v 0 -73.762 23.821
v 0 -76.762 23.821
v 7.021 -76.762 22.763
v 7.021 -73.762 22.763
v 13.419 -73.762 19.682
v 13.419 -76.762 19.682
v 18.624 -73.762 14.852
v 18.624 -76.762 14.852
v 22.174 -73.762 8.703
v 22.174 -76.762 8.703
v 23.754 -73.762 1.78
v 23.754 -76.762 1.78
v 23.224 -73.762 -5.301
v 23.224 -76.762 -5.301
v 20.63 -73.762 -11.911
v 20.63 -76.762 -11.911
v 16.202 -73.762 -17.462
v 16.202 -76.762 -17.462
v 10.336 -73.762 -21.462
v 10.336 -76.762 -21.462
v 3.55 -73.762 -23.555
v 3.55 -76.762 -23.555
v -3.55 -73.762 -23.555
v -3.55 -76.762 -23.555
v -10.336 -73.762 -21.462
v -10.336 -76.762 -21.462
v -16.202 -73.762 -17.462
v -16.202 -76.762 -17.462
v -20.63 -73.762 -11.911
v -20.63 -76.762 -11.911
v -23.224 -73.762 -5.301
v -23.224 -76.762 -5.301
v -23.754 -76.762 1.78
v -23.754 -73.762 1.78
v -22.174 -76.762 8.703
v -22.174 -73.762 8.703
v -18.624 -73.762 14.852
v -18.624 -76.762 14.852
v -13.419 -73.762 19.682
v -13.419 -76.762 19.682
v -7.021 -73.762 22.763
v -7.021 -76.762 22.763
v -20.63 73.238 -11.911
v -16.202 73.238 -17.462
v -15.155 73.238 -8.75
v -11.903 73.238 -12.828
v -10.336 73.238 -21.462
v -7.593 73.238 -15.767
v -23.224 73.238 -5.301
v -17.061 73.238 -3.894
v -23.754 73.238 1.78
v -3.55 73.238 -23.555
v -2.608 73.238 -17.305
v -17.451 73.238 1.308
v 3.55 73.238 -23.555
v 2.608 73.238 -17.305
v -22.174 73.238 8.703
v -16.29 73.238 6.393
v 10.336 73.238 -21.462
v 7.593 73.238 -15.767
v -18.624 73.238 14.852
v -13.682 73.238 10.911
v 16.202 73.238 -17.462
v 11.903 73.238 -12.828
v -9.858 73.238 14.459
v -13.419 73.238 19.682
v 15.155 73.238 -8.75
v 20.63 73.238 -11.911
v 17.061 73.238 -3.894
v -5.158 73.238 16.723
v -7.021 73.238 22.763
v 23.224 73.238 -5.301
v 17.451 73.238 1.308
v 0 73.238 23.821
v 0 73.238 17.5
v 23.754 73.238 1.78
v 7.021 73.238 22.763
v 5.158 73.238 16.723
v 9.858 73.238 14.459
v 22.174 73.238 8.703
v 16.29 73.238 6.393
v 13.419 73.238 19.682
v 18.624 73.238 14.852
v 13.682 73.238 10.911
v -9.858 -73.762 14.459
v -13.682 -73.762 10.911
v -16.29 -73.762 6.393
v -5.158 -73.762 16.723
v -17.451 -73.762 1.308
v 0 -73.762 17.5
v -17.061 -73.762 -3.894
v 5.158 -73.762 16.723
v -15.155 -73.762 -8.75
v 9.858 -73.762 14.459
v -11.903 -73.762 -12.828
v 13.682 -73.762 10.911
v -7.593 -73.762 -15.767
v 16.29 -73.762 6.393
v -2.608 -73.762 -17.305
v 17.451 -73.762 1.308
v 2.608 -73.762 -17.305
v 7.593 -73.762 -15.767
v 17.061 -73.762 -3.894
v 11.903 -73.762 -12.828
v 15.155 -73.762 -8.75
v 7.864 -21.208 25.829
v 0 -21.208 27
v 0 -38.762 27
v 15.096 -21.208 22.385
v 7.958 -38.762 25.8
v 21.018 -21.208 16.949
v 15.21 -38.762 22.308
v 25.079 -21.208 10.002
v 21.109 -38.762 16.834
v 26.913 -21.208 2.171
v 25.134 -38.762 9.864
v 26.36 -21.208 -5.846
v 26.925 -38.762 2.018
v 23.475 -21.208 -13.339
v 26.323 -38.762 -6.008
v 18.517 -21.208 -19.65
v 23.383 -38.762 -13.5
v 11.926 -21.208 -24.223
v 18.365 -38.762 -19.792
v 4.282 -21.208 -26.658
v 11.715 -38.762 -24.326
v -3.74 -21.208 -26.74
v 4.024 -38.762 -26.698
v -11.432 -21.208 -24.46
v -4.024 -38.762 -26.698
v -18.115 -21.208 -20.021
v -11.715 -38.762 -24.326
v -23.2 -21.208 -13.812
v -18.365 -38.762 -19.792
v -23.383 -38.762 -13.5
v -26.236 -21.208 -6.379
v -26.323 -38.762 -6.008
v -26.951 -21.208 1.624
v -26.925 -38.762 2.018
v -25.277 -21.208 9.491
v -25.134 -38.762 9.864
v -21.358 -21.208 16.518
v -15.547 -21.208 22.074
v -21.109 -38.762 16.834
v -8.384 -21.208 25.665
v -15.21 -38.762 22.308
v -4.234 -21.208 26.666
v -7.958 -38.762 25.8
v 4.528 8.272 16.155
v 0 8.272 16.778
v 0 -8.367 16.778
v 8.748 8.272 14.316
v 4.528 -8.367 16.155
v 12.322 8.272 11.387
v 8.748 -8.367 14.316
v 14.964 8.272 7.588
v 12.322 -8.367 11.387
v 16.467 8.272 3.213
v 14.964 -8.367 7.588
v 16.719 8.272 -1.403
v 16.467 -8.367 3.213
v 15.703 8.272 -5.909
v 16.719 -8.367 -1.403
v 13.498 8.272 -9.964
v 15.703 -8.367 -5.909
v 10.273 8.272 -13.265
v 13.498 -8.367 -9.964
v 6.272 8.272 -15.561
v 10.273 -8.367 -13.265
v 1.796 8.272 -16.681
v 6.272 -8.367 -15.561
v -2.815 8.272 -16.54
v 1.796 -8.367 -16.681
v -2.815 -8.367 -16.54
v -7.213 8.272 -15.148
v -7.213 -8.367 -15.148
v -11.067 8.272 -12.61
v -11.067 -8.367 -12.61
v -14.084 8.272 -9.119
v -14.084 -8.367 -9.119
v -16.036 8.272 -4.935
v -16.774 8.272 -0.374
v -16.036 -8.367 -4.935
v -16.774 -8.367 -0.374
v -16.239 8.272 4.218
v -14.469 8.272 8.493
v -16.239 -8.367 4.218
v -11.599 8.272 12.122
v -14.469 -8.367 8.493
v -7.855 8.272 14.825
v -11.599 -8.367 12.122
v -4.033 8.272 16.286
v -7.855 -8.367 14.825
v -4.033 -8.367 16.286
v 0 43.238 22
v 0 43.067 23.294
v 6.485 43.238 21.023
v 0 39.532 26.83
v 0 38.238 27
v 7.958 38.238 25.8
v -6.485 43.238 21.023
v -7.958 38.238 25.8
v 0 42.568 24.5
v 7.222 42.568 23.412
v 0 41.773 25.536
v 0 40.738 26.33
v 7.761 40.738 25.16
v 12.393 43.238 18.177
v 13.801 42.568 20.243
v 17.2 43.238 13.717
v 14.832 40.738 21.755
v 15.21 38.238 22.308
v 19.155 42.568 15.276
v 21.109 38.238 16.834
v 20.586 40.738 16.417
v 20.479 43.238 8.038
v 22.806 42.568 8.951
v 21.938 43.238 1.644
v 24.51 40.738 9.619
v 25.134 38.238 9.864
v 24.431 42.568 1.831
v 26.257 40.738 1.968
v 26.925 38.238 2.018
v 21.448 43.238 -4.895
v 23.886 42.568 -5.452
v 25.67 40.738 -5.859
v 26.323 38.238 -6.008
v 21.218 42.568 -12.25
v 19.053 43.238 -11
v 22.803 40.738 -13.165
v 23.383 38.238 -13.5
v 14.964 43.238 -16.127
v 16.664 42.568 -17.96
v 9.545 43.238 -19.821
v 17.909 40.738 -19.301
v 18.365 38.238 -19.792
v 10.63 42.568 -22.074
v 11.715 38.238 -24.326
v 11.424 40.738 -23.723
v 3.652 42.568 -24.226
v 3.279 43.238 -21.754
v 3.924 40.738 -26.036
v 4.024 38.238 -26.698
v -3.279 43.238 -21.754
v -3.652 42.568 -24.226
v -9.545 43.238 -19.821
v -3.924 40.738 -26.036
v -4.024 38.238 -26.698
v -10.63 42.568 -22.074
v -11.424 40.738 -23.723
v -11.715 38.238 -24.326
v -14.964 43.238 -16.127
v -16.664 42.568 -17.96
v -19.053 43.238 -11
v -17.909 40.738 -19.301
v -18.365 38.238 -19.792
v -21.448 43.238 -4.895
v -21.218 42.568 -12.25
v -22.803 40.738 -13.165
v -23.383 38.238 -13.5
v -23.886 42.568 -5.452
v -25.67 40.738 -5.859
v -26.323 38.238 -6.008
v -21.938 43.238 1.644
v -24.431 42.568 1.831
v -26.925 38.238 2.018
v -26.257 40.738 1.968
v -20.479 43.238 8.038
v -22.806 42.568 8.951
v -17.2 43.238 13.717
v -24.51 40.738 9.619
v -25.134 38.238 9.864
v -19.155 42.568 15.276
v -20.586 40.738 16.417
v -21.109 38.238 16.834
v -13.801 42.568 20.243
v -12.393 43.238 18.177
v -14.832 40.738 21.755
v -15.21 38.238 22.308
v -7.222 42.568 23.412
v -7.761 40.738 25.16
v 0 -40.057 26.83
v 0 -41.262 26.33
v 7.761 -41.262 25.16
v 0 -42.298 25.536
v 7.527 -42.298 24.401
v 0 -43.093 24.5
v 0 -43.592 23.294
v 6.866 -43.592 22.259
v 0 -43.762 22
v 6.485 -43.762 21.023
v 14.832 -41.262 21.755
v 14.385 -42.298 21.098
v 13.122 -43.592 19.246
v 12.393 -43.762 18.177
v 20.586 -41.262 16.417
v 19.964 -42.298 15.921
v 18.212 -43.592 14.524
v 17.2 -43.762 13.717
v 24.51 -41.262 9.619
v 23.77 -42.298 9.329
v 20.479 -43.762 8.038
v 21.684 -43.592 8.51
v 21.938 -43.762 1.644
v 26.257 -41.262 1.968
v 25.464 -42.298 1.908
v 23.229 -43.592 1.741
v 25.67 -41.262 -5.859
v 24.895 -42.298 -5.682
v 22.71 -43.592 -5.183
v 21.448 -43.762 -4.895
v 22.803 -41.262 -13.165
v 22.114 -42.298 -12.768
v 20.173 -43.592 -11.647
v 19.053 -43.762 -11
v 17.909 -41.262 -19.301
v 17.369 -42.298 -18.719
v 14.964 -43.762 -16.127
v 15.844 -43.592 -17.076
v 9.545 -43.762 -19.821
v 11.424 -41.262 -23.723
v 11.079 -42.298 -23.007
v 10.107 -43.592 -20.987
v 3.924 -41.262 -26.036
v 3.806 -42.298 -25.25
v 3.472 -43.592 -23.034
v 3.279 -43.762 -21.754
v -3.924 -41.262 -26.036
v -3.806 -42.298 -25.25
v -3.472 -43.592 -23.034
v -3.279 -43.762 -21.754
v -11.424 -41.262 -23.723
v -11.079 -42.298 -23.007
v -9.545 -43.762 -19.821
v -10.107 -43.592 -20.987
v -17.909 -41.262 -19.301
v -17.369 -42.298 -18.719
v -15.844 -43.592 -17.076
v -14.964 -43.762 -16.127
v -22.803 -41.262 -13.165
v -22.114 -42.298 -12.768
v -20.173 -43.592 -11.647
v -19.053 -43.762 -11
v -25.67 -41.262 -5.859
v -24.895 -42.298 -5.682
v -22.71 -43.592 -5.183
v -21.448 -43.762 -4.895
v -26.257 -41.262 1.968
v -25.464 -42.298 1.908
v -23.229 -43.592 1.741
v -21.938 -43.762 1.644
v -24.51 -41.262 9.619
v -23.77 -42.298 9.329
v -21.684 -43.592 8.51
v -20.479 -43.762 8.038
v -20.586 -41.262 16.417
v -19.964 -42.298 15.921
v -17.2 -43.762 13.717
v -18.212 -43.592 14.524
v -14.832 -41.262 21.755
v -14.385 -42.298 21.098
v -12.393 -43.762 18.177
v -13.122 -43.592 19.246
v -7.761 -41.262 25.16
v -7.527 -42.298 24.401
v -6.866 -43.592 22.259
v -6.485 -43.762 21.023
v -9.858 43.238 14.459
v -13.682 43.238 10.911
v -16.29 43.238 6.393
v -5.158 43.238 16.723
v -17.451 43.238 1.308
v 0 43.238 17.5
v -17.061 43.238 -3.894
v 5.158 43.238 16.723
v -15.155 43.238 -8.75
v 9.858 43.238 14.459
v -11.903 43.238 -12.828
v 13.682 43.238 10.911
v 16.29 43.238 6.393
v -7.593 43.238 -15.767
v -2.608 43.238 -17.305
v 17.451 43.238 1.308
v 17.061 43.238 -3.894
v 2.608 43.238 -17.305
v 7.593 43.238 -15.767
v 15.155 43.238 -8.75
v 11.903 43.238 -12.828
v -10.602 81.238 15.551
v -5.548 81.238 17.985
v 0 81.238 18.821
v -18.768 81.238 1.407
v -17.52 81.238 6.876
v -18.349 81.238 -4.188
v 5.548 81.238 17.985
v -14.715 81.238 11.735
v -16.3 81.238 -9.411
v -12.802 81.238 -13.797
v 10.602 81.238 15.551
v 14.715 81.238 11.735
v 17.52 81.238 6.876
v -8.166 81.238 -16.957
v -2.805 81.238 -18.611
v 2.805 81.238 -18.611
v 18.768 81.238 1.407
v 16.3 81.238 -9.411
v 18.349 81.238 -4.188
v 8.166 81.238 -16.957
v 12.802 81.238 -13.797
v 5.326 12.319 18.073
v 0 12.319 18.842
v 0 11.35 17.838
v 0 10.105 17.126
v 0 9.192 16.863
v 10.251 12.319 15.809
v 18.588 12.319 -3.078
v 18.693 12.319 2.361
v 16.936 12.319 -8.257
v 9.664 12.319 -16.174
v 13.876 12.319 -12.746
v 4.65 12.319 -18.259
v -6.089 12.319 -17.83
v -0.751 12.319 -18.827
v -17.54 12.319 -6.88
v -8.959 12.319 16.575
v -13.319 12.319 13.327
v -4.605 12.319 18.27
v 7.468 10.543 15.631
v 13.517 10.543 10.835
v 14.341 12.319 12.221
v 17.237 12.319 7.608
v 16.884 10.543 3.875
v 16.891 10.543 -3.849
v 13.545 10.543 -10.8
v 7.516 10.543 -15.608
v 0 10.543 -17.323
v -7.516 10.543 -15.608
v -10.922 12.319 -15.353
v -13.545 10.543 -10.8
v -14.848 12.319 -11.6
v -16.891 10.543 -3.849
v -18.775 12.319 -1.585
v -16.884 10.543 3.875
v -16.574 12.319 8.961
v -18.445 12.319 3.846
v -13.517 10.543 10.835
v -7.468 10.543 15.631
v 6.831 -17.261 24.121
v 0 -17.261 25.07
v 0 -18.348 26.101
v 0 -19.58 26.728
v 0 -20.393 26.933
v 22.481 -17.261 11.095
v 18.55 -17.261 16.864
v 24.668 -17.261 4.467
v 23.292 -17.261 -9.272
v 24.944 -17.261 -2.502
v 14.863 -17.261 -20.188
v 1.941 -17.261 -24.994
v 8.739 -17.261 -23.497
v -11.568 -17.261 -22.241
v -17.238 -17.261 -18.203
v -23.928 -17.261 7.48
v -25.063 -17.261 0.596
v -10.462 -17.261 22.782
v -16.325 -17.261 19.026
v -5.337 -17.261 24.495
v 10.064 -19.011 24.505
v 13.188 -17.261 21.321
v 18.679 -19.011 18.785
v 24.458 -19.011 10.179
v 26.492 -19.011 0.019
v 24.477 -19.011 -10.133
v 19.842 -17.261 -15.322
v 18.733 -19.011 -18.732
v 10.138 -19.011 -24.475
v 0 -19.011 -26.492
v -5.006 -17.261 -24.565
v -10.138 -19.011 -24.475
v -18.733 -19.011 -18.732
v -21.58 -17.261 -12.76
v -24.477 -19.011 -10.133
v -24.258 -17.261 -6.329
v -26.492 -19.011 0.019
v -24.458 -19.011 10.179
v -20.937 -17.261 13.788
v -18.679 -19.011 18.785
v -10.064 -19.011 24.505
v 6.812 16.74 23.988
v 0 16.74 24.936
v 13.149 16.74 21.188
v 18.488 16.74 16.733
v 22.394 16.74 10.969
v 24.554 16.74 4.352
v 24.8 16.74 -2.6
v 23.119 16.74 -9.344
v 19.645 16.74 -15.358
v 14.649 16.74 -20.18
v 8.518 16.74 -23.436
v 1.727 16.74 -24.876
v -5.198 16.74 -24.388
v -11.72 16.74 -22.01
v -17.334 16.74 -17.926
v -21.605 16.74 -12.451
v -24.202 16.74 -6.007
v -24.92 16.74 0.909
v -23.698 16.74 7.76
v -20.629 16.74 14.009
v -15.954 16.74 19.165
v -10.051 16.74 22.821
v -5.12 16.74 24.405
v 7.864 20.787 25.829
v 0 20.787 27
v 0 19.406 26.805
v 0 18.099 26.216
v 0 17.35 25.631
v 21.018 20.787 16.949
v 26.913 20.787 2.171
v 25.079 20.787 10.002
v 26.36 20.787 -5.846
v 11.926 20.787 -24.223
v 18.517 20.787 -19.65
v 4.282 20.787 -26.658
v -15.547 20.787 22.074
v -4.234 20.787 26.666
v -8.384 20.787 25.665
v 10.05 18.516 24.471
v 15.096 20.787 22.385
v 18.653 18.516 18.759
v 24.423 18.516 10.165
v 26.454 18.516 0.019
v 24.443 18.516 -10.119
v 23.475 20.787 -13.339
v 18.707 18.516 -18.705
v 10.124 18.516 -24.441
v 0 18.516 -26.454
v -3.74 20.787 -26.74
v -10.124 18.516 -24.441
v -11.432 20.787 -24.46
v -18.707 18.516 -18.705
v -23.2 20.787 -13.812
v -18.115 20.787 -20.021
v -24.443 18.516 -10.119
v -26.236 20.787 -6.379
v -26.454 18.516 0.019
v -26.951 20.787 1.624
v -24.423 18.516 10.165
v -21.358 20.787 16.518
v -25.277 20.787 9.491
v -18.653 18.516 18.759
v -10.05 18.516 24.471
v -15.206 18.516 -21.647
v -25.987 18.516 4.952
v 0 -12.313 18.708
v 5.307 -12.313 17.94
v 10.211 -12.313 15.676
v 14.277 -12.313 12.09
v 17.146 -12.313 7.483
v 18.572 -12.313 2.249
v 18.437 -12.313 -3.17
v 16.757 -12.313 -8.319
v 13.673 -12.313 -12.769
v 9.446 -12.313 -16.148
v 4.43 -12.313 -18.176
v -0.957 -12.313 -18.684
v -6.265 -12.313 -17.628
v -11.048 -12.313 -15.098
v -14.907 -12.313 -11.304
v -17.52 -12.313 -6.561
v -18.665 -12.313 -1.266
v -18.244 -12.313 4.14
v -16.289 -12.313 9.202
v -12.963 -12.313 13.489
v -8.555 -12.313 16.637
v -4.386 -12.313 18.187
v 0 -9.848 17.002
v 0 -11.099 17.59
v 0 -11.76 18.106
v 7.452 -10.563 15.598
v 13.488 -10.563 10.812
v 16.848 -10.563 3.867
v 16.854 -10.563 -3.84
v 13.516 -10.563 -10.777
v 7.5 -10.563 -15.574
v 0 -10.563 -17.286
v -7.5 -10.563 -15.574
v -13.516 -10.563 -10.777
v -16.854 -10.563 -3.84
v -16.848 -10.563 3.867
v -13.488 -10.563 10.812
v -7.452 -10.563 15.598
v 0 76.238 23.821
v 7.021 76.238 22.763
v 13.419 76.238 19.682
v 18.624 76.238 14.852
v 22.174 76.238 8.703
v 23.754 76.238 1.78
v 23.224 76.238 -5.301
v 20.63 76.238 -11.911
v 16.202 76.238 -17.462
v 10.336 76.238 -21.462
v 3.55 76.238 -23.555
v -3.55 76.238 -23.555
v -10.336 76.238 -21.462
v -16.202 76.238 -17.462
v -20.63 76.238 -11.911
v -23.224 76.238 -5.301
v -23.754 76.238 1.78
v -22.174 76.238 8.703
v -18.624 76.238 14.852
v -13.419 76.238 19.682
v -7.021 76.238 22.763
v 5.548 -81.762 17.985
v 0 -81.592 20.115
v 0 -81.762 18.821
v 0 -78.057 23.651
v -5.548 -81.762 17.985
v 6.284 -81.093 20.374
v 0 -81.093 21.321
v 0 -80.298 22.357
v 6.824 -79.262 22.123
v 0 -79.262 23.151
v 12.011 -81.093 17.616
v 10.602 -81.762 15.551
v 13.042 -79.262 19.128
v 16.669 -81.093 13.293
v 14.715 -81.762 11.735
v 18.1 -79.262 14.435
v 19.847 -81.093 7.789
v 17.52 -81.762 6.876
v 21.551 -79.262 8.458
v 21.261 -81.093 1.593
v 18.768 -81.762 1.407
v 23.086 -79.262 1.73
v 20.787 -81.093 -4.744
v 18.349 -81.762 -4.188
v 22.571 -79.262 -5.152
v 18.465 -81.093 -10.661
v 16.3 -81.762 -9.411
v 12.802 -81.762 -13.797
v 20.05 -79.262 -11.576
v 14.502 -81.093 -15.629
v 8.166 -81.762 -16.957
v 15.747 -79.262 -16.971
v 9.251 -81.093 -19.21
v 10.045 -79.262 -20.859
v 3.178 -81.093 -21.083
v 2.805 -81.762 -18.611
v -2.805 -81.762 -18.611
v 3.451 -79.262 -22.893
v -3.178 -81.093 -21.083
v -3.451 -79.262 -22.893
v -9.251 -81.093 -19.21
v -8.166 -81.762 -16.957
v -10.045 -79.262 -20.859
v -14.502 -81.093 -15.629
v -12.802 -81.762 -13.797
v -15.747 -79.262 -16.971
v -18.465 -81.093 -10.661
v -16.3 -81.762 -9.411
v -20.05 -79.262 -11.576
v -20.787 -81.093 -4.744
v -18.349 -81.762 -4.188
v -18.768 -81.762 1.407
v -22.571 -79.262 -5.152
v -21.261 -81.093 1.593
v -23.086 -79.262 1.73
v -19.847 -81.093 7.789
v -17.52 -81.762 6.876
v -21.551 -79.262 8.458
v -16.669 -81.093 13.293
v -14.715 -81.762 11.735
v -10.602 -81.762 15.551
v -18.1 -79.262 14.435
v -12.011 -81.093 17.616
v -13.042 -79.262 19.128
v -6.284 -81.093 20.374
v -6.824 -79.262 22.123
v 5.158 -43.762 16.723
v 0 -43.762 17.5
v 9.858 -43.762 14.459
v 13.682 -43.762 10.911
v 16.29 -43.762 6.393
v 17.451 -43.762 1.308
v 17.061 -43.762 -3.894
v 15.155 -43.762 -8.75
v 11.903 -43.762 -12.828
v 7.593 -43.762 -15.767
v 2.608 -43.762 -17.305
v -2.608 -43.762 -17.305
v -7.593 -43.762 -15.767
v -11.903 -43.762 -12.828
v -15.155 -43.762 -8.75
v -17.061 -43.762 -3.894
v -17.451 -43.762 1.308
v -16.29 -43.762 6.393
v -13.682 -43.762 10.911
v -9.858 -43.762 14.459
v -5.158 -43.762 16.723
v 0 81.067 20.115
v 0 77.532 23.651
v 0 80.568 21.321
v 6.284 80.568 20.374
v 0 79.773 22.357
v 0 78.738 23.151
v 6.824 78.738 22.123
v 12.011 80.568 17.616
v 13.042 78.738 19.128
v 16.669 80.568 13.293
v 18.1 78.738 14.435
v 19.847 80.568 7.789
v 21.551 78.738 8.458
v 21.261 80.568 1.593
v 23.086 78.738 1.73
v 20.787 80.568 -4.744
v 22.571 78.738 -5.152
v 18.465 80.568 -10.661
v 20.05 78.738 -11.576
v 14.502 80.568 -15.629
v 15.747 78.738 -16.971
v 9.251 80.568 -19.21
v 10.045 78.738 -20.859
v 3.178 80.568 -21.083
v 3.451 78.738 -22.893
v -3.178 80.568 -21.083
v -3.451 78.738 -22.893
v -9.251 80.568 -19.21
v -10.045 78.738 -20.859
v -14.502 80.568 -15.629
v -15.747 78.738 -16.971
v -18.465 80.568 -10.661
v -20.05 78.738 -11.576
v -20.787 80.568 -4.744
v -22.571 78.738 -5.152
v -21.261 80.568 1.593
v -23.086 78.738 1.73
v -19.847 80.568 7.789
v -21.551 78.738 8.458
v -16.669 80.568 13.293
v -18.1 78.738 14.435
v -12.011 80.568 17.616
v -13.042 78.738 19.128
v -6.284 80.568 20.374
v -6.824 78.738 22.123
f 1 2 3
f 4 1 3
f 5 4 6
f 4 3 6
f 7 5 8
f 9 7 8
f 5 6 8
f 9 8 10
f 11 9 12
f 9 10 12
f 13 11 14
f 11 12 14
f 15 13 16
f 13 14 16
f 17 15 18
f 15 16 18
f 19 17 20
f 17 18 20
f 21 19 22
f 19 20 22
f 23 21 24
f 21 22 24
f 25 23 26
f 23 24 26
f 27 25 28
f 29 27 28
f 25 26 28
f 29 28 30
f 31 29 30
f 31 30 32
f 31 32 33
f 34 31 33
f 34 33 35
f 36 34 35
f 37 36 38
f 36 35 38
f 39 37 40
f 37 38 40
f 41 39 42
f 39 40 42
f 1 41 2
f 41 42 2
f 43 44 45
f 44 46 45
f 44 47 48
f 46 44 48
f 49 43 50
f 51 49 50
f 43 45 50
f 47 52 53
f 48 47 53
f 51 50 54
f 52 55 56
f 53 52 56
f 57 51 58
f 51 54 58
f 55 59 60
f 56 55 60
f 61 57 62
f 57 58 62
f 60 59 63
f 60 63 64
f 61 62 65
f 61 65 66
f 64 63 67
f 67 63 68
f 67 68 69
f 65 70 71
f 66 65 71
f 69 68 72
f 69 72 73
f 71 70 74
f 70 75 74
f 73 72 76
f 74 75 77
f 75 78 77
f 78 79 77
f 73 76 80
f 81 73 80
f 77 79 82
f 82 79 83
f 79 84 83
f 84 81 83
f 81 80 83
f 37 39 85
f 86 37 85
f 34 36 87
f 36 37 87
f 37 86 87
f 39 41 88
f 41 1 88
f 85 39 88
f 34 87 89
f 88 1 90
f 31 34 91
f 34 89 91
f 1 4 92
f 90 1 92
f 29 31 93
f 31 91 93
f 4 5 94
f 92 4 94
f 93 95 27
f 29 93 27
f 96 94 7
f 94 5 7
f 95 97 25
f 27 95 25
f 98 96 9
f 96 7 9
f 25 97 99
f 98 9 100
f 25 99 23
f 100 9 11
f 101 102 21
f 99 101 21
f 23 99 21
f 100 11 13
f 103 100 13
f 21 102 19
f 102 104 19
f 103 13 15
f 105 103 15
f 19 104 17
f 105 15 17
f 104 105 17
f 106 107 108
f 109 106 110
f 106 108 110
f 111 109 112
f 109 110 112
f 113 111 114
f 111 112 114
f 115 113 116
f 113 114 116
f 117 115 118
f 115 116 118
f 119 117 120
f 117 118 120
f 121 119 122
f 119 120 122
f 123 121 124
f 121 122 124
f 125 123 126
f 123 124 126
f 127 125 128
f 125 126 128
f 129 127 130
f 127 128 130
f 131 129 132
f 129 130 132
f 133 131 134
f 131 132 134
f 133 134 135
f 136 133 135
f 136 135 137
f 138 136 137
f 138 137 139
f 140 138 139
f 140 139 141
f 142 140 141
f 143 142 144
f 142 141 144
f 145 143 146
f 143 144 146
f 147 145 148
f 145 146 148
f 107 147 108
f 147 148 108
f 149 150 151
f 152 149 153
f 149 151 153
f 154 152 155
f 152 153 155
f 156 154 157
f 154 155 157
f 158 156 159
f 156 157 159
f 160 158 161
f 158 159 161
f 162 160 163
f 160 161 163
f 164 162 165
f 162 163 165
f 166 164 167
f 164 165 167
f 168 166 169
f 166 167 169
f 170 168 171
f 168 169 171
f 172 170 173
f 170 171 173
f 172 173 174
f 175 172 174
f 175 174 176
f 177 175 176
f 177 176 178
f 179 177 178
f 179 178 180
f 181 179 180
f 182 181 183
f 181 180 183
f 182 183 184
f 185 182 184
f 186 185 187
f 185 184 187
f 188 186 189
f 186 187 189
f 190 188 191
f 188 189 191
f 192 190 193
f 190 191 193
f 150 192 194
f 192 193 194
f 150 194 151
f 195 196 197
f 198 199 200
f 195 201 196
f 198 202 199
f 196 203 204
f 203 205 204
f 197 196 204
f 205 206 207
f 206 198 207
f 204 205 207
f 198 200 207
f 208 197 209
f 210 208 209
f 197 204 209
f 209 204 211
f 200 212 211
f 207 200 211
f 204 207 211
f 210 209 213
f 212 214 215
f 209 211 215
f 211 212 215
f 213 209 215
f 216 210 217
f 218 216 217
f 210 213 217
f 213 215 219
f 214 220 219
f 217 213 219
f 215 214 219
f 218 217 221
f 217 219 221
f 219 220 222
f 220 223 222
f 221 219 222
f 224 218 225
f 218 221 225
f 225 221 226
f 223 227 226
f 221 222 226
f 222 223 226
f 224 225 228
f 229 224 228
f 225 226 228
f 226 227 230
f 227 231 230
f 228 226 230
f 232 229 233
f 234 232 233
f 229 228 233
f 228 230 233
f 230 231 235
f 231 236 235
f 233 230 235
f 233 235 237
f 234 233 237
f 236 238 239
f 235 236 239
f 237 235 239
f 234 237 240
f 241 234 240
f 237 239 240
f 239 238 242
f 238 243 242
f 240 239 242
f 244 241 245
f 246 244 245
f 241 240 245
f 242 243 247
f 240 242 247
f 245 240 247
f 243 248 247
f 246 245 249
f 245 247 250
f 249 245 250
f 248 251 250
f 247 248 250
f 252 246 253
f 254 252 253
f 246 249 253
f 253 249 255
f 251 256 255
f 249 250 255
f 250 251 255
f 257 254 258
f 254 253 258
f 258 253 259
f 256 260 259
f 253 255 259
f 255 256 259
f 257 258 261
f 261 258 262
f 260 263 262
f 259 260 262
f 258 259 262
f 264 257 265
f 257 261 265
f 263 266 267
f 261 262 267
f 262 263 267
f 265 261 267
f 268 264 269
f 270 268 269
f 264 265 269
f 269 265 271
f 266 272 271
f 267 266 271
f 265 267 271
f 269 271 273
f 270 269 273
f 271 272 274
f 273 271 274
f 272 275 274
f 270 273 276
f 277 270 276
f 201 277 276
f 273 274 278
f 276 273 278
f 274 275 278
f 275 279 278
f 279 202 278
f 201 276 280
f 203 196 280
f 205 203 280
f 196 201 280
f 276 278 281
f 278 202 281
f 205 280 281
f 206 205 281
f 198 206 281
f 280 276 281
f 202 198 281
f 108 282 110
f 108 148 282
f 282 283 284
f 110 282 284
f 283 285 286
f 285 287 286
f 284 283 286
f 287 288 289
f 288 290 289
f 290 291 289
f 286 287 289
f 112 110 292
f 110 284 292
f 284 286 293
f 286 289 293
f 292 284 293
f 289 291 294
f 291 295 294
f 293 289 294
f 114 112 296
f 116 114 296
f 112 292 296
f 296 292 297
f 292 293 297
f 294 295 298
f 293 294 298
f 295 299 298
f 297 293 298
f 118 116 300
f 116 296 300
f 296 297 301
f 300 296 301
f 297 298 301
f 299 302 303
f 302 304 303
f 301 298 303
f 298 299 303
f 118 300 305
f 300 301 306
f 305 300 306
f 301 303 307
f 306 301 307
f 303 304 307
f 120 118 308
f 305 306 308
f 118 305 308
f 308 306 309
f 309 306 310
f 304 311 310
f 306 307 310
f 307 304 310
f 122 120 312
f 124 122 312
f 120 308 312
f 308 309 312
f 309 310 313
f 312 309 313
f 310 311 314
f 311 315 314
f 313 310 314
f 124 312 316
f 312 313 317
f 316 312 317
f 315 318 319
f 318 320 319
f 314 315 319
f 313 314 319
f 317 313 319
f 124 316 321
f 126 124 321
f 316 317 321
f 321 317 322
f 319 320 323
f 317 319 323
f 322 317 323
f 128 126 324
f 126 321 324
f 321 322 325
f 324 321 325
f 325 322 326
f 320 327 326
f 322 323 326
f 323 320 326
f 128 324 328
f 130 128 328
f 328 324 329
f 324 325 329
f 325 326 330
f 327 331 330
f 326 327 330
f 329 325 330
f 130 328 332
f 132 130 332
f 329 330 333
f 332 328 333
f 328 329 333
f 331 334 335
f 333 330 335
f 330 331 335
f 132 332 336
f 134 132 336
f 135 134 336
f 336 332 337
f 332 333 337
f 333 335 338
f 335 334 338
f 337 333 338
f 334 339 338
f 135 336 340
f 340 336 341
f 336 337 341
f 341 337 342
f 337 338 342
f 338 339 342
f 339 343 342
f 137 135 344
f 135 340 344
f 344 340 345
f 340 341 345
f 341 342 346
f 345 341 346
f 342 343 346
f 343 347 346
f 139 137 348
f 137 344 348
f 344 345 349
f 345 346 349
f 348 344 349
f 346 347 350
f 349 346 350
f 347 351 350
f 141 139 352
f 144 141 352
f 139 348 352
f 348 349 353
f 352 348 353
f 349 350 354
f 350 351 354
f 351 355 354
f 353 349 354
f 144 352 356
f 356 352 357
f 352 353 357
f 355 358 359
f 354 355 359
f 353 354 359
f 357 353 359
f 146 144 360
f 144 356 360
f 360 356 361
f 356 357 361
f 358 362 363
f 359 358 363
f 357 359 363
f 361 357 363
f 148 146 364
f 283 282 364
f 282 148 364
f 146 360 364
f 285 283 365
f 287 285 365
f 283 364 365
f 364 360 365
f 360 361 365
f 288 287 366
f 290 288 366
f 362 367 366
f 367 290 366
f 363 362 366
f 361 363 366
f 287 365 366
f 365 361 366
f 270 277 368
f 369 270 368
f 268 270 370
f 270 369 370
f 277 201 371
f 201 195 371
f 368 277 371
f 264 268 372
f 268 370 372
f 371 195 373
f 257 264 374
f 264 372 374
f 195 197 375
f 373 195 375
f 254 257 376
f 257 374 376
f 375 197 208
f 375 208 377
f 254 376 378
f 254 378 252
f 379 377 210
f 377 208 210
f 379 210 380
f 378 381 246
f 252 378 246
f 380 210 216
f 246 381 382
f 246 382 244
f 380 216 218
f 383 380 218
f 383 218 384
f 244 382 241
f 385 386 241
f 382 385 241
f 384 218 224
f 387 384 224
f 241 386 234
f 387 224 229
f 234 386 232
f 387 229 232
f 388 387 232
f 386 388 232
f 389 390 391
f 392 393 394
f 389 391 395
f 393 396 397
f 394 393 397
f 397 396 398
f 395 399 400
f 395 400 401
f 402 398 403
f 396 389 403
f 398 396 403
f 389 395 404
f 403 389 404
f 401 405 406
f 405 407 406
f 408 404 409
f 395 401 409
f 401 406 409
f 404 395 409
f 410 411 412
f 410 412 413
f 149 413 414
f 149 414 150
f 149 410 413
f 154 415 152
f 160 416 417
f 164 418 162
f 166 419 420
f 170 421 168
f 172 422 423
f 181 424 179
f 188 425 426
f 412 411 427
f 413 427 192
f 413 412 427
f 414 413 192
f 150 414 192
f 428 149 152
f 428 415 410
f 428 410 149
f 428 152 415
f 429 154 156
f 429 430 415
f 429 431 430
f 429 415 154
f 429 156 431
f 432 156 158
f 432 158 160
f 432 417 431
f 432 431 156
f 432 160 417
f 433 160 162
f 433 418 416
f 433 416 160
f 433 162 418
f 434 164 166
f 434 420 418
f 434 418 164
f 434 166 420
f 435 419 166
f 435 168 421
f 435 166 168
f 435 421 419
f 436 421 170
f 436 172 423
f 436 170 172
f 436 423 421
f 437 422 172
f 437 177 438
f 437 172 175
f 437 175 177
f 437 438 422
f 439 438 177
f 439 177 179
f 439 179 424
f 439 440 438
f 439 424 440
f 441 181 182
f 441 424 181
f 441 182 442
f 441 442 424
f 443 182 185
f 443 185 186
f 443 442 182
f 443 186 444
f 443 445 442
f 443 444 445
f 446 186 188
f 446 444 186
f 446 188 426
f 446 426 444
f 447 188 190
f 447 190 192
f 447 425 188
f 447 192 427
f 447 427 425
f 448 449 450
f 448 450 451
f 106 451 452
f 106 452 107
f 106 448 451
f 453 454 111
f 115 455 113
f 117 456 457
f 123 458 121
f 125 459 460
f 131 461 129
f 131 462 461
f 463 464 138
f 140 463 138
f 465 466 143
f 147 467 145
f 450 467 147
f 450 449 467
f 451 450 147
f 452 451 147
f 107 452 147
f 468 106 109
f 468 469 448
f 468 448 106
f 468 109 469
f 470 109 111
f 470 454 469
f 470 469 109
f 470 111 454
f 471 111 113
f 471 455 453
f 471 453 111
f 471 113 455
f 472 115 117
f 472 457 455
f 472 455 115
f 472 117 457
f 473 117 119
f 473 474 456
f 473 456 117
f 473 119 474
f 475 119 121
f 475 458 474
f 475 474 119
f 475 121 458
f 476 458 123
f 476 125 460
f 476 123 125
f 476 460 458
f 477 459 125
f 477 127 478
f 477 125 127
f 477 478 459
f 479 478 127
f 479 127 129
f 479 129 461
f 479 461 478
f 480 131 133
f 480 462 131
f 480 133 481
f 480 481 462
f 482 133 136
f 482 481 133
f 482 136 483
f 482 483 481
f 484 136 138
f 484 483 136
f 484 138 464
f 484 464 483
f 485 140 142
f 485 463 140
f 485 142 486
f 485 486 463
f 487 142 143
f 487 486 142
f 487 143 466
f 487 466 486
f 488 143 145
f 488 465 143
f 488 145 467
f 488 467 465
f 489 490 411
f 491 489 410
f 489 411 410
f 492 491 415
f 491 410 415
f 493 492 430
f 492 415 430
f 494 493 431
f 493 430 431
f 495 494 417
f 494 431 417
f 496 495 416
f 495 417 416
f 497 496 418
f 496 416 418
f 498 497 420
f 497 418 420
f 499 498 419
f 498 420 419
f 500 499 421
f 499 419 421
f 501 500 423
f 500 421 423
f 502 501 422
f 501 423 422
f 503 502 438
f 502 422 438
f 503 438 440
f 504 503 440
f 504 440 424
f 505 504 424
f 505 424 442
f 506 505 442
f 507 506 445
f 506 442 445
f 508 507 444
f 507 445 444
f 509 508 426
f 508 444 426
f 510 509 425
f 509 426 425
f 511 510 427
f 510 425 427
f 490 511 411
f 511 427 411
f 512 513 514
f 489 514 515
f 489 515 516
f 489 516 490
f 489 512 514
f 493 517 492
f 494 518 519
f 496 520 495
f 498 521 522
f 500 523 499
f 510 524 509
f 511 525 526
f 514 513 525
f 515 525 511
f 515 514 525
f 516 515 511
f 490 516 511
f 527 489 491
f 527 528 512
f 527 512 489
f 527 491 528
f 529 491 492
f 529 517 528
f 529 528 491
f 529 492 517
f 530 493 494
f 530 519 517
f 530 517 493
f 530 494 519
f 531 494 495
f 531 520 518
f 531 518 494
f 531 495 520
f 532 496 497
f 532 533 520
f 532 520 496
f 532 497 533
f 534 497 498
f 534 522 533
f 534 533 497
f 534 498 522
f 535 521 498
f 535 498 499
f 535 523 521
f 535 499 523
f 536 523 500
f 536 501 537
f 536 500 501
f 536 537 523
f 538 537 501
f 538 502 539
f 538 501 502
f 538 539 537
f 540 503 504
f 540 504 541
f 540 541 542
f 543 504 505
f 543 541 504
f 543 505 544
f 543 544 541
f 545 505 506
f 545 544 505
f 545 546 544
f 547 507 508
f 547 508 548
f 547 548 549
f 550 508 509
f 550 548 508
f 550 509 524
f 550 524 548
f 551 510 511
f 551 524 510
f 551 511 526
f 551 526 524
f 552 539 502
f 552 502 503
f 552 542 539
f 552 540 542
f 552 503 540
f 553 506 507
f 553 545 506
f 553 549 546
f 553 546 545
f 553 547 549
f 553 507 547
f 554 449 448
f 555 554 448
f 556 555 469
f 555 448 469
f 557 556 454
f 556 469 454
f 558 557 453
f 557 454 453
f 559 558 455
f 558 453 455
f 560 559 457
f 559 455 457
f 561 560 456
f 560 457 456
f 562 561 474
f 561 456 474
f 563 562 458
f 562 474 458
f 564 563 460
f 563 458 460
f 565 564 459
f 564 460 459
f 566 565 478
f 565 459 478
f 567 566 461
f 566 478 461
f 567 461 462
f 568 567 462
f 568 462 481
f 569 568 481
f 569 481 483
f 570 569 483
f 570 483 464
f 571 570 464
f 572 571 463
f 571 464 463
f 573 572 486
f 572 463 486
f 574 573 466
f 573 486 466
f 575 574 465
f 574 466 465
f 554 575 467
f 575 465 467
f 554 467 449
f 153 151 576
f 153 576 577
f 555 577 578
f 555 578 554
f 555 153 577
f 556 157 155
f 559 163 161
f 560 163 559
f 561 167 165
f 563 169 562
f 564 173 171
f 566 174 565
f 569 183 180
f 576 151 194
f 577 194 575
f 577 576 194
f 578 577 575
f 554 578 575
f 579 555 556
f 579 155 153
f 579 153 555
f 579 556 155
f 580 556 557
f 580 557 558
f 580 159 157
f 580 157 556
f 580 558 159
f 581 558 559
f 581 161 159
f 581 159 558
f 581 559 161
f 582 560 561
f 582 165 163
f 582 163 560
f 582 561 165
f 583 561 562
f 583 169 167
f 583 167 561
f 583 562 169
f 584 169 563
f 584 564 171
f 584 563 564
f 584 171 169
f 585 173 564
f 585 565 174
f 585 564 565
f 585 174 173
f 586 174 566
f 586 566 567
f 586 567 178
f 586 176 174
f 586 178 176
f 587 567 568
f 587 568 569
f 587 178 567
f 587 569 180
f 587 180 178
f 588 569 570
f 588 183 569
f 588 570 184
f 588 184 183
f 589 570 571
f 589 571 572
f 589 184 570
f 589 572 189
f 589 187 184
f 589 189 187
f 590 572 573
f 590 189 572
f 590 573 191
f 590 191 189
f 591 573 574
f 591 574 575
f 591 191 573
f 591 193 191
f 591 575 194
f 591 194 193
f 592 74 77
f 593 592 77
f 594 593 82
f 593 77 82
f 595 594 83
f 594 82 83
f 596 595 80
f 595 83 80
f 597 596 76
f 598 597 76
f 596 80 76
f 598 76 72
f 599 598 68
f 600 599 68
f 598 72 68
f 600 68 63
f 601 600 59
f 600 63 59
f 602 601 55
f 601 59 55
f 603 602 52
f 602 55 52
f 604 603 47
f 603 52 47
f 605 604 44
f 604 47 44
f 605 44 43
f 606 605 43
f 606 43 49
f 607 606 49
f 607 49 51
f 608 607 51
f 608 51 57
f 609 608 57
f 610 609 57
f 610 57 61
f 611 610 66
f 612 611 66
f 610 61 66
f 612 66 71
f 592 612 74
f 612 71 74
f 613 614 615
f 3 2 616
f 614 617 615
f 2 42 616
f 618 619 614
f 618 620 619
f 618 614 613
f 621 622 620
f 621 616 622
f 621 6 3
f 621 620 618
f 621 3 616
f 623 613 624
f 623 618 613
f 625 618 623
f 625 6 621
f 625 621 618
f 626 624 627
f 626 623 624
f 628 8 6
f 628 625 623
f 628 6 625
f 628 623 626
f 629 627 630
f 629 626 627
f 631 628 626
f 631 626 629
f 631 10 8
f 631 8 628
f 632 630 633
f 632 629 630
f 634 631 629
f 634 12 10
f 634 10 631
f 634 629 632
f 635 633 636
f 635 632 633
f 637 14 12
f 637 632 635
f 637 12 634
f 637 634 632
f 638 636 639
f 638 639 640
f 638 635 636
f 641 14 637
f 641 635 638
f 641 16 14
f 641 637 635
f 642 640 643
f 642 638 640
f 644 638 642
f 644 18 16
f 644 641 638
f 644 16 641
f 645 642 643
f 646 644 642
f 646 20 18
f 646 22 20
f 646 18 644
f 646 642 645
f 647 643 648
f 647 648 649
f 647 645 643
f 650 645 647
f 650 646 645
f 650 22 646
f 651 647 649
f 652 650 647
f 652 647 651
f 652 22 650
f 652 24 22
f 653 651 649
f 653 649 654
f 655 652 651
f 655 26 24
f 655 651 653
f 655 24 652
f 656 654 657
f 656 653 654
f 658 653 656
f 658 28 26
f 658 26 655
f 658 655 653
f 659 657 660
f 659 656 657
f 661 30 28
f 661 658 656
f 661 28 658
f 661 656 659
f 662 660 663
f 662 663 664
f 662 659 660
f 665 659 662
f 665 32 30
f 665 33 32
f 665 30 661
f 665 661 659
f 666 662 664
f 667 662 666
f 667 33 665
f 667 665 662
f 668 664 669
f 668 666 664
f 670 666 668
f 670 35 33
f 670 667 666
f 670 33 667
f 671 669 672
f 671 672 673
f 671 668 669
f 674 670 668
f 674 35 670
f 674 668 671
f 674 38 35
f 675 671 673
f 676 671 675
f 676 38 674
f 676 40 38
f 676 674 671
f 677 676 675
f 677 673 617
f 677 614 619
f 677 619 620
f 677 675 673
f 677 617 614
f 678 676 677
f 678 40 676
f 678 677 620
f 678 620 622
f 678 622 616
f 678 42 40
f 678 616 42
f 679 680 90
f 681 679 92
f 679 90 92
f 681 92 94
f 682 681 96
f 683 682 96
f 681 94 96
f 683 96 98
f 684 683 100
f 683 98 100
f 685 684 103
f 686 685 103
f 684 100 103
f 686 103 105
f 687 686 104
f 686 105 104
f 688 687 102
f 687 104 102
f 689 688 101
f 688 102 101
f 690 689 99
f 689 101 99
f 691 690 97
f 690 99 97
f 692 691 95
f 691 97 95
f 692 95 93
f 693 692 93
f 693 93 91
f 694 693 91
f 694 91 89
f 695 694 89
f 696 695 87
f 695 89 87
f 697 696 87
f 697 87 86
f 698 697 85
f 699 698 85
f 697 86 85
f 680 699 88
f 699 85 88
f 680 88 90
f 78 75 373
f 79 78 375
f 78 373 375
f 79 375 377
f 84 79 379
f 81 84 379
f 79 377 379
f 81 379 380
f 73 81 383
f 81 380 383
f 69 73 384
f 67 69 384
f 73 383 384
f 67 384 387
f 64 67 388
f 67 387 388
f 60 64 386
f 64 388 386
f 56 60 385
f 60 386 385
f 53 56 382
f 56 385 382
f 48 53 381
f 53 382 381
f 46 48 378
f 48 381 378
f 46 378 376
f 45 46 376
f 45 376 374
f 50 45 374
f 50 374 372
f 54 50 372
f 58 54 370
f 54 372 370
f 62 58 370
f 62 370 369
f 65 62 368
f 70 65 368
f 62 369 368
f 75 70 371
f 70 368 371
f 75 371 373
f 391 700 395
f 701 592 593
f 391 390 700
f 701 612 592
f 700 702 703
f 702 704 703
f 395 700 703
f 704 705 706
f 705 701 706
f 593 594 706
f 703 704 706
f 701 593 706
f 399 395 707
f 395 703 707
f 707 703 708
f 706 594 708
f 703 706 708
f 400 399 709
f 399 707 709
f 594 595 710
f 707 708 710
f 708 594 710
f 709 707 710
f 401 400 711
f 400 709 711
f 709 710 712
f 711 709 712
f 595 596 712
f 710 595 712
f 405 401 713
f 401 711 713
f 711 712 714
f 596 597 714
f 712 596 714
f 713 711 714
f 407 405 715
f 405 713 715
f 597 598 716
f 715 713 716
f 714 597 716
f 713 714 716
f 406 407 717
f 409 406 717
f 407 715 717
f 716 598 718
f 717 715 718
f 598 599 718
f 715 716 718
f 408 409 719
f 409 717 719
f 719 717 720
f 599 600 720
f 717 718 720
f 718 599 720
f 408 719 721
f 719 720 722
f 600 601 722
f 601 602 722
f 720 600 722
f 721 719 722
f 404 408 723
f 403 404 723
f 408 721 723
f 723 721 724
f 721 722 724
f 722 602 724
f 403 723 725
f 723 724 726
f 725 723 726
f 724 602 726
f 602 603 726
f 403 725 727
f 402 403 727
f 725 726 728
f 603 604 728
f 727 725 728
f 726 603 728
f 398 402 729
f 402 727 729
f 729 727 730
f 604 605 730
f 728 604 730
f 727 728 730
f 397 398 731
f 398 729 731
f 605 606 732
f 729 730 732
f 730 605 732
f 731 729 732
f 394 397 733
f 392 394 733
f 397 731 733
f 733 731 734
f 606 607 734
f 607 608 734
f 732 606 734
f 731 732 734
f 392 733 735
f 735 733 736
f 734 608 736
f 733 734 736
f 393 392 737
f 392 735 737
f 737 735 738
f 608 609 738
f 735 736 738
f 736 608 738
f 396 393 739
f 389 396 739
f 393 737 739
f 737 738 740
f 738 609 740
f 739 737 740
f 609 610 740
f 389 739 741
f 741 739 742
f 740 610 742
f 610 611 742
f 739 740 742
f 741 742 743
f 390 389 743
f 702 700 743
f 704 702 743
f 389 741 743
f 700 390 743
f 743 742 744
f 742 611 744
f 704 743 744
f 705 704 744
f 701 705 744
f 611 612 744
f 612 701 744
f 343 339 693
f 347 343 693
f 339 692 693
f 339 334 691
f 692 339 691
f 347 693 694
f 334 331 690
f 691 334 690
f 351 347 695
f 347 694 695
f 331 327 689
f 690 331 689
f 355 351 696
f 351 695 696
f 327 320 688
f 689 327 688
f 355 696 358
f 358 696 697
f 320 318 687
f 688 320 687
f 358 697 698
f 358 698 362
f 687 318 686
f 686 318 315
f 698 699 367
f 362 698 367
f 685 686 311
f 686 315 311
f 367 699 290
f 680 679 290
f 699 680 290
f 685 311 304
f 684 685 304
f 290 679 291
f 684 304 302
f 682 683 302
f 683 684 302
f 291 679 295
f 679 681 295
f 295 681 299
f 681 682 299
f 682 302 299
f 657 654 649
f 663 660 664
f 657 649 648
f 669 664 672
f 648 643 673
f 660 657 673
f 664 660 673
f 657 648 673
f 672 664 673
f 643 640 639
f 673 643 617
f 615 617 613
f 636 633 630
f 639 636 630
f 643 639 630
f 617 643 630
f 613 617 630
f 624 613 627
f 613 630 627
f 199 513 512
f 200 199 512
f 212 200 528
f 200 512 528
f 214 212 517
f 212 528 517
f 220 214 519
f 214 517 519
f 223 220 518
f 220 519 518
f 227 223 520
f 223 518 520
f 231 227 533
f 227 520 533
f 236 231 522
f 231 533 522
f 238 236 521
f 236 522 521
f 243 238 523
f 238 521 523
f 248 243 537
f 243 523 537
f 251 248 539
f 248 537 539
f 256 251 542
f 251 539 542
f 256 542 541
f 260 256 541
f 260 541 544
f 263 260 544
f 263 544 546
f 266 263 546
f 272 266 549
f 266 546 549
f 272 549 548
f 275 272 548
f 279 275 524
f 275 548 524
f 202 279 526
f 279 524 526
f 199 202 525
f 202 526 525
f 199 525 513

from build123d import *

# Parameters (mm, degrees)
F2_R = 5


with BuildPart() as f1:
    # F0 (on Right) → F1 (revolve)
    with BuildSketch(Plane.YZ):
        Polygon((-81.762466, 23.821083), (-81.762466, 0), (81.237534, 0), (81.237534, 23.821083), (73.237534, 23.821083), (73.237534, 17.5), (43.237534, 17.5), (43.237534, 27), (18.237534, 27), (10.821289, 16.777731), (-10.811986, 16.777731), (-18.762466, 27), (-43.762466, 27), (-43.762466, 17.5), (-73.762466, 17.5), (-73.762466, 23.821083), align=None)
    revolve(axis=Axis((0, -0.262466, 0), (0, 1, 0)))

    # F2
    f2_edges = [f1.edges().sort_by_distance(p)[0] for p in [
        (0, -81.762466, -23.821083),
        (0, -43.762466, -27),
        (0, -18.762466, -27),
        (0, -10.811986, -16.777731),
        (0, 10.821289, -16.777731),
        (0, 18.237534, -27),
        (0, 43.237534, -27),
        (0, 81.237534, -23.821083),
    ]]
    fillet(f2_edges, radius=F2_R)


solid = f1.part
